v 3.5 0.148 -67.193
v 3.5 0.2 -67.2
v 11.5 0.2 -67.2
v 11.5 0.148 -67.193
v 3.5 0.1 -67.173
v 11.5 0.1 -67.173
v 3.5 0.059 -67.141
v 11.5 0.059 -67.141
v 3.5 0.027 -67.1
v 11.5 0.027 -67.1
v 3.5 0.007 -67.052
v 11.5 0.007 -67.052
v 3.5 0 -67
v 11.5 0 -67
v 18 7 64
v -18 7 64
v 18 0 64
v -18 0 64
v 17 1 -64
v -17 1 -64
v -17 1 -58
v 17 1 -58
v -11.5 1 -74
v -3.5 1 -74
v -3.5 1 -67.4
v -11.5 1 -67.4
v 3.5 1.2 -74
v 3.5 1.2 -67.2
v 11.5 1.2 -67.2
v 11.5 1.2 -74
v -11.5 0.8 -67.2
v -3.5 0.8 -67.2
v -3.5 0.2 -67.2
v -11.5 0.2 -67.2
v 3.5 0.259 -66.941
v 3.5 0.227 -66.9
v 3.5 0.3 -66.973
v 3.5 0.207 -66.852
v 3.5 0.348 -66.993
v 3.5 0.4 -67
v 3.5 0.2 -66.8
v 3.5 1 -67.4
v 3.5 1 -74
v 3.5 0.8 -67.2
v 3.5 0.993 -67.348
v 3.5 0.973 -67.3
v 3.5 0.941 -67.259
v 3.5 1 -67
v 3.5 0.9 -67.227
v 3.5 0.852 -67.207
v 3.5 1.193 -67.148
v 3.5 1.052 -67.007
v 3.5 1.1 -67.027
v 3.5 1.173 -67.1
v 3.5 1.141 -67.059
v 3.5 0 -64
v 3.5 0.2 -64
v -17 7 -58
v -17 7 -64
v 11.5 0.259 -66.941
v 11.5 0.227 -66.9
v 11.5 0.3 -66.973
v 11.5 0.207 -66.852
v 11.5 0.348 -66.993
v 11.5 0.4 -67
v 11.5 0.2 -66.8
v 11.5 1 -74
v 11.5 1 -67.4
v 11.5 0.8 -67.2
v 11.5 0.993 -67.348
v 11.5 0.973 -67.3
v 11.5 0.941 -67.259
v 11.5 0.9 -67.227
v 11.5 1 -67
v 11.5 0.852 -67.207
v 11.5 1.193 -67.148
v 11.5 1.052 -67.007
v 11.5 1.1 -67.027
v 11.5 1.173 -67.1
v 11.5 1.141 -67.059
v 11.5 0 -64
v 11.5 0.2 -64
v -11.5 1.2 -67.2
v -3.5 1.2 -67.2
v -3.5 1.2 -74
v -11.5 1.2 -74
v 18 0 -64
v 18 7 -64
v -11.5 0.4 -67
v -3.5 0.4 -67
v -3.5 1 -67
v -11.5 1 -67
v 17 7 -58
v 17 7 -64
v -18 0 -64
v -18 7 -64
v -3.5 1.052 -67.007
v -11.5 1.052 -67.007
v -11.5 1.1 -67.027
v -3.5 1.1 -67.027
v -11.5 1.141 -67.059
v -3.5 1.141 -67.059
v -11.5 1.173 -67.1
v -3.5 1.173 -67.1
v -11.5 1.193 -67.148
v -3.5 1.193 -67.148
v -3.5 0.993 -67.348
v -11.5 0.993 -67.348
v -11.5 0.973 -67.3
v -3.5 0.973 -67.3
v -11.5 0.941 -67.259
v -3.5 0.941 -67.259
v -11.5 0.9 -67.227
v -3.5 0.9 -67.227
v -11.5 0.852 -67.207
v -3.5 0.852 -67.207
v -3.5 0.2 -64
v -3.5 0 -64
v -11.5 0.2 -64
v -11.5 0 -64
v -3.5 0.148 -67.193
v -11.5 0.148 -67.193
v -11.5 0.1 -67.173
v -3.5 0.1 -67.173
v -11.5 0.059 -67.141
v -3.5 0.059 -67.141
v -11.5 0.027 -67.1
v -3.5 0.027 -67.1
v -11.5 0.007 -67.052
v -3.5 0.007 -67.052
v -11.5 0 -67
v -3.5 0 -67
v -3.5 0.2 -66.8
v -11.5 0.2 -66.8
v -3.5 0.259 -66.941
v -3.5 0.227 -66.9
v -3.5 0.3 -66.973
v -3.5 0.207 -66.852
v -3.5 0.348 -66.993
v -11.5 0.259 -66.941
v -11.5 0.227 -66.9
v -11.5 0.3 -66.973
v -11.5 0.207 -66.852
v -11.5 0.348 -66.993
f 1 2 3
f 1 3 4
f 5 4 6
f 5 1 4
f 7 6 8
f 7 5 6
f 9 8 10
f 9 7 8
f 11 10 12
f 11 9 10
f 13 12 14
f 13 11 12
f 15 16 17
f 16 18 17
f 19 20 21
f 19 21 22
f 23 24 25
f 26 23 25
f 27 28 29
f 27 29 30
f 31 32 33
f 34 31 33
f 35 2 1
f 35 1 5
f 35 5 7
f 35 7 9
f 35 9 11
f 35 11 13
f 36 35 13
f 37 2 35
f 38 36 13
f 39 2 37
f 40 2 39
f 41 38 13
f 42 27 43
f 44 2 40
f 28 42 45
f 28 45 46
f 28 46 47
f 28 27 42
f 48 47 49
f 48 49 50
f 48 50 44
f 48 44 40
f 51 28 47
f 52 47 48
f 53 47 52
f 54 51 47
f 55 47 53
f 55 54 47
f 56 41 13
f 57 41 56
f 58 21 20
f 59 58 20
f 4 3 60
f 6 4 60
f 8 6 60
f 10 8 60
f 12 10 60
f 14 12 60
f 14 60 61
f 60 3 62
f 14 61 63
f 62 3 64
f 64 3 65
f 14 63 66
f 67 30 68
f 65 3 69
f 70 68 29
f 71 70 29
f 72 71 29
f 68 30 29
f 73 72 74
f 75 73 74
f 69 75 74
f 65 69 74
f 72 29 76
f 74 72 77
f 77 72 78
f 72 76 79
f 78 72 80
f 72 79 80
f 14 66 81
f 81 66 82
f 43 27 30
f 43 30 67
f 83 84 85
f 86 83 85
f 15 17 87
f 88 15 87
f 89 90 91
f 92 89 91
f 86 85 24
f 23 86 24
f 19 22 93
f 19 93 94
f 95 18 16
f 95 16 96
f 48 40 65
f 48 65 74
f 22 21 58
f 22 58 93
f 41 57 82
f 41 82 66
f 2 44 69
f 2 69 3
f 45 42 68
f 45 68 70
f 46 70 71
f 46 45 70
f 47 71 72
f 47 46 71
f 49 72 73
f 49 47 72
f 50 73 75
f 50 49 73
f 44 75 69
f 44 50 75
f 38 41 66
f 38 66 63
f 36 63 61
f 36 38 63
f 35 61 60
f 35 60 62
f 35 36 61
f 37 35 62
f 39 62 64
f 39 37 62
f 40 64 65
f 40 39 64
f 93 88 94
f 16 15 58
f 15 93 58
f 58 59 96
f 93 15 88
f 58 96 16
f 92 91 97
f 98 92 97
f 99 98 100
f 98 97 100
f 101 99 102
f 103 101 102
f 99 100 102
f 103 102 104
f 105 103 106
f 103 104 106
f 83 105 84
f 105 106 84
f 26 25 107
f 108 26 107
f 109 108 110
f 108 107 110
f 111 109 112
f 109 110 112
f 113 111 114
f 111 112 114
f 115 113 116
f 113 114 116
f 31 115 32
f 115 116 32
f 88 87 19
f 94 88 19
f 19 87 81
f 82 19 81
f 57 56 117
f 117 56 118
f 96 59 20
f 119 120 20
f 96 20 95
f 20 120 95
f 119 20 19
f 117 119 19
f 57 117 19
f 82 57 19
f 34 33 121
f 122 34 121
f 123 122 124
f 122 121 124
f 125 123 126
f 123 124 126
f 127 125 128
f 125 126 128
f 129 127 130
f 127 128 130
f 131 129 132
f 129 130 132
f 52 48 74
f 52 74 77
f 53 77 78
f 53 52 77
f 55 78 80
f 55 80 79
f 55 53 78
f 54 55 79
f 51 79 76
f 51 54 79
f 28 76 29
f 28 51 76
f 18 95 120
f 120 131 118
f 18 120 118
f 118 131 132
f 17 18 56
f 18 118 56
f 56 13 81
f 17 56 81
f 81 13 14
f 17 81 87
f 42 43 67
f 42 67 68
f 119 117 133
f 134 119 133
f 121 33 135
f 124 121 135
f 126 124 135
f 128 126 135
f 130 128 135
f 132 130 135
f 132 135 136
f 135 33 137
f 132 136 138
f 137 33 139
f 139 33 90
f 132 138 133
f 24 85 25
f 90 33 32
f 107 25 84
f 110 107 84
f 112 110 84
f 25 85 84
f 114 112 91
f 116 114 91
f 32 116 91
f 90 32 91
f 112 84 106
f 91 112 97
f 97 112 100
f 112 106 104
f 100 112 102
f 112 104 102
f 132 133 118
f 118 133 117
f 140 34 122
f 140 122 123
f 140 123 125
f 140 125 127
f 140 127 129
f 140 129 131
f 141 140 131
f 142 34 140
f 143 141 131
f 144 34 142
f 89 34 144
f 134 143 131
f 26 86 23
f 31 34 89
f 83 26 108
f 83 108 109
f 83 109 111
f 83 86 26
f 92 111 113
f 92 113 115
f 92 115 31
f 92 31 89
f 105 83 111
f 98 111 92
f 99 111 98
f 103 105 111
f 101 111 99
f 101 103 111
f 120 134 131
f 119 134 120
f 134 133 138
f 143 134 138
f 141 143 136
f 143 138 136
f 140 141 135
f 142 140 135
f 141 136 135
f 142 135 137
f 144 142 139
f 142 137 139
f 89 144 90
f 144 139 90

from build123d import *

# Parameters (mm, degrees)
SKETCH1_W           = 36
SKETCH1_H           = 128
BOSS_EXTRUDE1_DEPTH = 1
SKETCH2_W           = 36
SKETCH2_H           = 122
BOSS_EXTRUDE2_DEPTH = 6
SKETCH3_W           = 1
SKETCH3_H           = 6
BOSS_EXTRUDE3_DEPTH = 6
BOSS_EXTRUDE4_START = 3.5
BOSS_EXTRUDE4_DEPTH = 8


with BuildPart() as part:
    # Sketch1 → Boss-Extrude1 (new body)
    with BuildSketch(Plane(origin=(0, 0, 0), x_dir=(1, 0, 0), z_dir=(0, 1, 0))):
        Rectangle(SKETCH1_W, SKETCH1_H)
    extrude(amount=BOSS_EXTRUDE1_DEPTH)

    # Sketch2 → Boss-Extrude2 (add)
    with BuildSketch(Plane(origin=(0, 1, 0), x_dir=(1, 0, 0), z_dir=(0, 1, 0))):
        with Locations((0, -3)):
            Rectangle(SKETCH2_W, SKETCH2_H)
    extrude(amount=BOSS_EXTRUDE2_DEPTH)

    # Sketch3 → Boss-Extrude3 (add)
    with BuildSketch(Plane(origin=(0, 1, 0), x_dir=(1, 0, 0), z_dir=(0, 1, 0))):
        with Locations((-17.5, 61)):
            Rectangle(SKETCH3_W, SKETCH3_H)
    boss_extrude3 = extrude(amount=BOSS_EXTRUDE3_DEPTH)

    # Sketch4 → Boss-Extrude4 (add)
    with BuildSketch(Plane(origin=(0, 0, 0), x_dir=(0, 0, -1), z_dir=(1, 0, 0)).offset(BOSS_EXTRUDE4_START)):
        with BuildLine():
            Line((67.2, 1.2), (74, 1.2))
            Line((74, 1.2), (74, 1))
            Line((74, 1), (67.4, 1))
            ThreePointArc((67.4, 1), (67.258578644, 0.941421356), (67.2, 0.8))
            Line((67.2, 0.8), (67.2, 0.2))
            ThreePointArc((67.2, 0.2), (67.141421356, 0.058578644), (67, 0))
            Line((67, 0), (64, 0))
            Line((64, 0), (64, 0.2))
            Line((64, 0.2), (66.8, 0.2))
            ThreePointArc((66.8, 0.2), (66.941421356, 0.258578644), (67, 0.4))
            Line((67, 0.4), (67, 1))
            ThreePointArc((67, 1), (67.058578644, 1.141421356), (67.2, 1.2))
        make_face()
    boss_extrude4 = extrude(amount=BOSS_EXTRUDE4_DEPTH)

    # Mirror1: Boss-Extrude3, Boss-Extrude4 across plane
    add(boss_extrude3.mirror(Plane(origin=(0, 0, 0), x_dir=(0, 0, 1), z_dir=(1, 0, 0))))
    add(boss_extrude4.mirror(Plane(origin=(0, 0, 0), x_dir=(0, 0, 1), z_dir=(1, 0, 0))))


solid = part.part
